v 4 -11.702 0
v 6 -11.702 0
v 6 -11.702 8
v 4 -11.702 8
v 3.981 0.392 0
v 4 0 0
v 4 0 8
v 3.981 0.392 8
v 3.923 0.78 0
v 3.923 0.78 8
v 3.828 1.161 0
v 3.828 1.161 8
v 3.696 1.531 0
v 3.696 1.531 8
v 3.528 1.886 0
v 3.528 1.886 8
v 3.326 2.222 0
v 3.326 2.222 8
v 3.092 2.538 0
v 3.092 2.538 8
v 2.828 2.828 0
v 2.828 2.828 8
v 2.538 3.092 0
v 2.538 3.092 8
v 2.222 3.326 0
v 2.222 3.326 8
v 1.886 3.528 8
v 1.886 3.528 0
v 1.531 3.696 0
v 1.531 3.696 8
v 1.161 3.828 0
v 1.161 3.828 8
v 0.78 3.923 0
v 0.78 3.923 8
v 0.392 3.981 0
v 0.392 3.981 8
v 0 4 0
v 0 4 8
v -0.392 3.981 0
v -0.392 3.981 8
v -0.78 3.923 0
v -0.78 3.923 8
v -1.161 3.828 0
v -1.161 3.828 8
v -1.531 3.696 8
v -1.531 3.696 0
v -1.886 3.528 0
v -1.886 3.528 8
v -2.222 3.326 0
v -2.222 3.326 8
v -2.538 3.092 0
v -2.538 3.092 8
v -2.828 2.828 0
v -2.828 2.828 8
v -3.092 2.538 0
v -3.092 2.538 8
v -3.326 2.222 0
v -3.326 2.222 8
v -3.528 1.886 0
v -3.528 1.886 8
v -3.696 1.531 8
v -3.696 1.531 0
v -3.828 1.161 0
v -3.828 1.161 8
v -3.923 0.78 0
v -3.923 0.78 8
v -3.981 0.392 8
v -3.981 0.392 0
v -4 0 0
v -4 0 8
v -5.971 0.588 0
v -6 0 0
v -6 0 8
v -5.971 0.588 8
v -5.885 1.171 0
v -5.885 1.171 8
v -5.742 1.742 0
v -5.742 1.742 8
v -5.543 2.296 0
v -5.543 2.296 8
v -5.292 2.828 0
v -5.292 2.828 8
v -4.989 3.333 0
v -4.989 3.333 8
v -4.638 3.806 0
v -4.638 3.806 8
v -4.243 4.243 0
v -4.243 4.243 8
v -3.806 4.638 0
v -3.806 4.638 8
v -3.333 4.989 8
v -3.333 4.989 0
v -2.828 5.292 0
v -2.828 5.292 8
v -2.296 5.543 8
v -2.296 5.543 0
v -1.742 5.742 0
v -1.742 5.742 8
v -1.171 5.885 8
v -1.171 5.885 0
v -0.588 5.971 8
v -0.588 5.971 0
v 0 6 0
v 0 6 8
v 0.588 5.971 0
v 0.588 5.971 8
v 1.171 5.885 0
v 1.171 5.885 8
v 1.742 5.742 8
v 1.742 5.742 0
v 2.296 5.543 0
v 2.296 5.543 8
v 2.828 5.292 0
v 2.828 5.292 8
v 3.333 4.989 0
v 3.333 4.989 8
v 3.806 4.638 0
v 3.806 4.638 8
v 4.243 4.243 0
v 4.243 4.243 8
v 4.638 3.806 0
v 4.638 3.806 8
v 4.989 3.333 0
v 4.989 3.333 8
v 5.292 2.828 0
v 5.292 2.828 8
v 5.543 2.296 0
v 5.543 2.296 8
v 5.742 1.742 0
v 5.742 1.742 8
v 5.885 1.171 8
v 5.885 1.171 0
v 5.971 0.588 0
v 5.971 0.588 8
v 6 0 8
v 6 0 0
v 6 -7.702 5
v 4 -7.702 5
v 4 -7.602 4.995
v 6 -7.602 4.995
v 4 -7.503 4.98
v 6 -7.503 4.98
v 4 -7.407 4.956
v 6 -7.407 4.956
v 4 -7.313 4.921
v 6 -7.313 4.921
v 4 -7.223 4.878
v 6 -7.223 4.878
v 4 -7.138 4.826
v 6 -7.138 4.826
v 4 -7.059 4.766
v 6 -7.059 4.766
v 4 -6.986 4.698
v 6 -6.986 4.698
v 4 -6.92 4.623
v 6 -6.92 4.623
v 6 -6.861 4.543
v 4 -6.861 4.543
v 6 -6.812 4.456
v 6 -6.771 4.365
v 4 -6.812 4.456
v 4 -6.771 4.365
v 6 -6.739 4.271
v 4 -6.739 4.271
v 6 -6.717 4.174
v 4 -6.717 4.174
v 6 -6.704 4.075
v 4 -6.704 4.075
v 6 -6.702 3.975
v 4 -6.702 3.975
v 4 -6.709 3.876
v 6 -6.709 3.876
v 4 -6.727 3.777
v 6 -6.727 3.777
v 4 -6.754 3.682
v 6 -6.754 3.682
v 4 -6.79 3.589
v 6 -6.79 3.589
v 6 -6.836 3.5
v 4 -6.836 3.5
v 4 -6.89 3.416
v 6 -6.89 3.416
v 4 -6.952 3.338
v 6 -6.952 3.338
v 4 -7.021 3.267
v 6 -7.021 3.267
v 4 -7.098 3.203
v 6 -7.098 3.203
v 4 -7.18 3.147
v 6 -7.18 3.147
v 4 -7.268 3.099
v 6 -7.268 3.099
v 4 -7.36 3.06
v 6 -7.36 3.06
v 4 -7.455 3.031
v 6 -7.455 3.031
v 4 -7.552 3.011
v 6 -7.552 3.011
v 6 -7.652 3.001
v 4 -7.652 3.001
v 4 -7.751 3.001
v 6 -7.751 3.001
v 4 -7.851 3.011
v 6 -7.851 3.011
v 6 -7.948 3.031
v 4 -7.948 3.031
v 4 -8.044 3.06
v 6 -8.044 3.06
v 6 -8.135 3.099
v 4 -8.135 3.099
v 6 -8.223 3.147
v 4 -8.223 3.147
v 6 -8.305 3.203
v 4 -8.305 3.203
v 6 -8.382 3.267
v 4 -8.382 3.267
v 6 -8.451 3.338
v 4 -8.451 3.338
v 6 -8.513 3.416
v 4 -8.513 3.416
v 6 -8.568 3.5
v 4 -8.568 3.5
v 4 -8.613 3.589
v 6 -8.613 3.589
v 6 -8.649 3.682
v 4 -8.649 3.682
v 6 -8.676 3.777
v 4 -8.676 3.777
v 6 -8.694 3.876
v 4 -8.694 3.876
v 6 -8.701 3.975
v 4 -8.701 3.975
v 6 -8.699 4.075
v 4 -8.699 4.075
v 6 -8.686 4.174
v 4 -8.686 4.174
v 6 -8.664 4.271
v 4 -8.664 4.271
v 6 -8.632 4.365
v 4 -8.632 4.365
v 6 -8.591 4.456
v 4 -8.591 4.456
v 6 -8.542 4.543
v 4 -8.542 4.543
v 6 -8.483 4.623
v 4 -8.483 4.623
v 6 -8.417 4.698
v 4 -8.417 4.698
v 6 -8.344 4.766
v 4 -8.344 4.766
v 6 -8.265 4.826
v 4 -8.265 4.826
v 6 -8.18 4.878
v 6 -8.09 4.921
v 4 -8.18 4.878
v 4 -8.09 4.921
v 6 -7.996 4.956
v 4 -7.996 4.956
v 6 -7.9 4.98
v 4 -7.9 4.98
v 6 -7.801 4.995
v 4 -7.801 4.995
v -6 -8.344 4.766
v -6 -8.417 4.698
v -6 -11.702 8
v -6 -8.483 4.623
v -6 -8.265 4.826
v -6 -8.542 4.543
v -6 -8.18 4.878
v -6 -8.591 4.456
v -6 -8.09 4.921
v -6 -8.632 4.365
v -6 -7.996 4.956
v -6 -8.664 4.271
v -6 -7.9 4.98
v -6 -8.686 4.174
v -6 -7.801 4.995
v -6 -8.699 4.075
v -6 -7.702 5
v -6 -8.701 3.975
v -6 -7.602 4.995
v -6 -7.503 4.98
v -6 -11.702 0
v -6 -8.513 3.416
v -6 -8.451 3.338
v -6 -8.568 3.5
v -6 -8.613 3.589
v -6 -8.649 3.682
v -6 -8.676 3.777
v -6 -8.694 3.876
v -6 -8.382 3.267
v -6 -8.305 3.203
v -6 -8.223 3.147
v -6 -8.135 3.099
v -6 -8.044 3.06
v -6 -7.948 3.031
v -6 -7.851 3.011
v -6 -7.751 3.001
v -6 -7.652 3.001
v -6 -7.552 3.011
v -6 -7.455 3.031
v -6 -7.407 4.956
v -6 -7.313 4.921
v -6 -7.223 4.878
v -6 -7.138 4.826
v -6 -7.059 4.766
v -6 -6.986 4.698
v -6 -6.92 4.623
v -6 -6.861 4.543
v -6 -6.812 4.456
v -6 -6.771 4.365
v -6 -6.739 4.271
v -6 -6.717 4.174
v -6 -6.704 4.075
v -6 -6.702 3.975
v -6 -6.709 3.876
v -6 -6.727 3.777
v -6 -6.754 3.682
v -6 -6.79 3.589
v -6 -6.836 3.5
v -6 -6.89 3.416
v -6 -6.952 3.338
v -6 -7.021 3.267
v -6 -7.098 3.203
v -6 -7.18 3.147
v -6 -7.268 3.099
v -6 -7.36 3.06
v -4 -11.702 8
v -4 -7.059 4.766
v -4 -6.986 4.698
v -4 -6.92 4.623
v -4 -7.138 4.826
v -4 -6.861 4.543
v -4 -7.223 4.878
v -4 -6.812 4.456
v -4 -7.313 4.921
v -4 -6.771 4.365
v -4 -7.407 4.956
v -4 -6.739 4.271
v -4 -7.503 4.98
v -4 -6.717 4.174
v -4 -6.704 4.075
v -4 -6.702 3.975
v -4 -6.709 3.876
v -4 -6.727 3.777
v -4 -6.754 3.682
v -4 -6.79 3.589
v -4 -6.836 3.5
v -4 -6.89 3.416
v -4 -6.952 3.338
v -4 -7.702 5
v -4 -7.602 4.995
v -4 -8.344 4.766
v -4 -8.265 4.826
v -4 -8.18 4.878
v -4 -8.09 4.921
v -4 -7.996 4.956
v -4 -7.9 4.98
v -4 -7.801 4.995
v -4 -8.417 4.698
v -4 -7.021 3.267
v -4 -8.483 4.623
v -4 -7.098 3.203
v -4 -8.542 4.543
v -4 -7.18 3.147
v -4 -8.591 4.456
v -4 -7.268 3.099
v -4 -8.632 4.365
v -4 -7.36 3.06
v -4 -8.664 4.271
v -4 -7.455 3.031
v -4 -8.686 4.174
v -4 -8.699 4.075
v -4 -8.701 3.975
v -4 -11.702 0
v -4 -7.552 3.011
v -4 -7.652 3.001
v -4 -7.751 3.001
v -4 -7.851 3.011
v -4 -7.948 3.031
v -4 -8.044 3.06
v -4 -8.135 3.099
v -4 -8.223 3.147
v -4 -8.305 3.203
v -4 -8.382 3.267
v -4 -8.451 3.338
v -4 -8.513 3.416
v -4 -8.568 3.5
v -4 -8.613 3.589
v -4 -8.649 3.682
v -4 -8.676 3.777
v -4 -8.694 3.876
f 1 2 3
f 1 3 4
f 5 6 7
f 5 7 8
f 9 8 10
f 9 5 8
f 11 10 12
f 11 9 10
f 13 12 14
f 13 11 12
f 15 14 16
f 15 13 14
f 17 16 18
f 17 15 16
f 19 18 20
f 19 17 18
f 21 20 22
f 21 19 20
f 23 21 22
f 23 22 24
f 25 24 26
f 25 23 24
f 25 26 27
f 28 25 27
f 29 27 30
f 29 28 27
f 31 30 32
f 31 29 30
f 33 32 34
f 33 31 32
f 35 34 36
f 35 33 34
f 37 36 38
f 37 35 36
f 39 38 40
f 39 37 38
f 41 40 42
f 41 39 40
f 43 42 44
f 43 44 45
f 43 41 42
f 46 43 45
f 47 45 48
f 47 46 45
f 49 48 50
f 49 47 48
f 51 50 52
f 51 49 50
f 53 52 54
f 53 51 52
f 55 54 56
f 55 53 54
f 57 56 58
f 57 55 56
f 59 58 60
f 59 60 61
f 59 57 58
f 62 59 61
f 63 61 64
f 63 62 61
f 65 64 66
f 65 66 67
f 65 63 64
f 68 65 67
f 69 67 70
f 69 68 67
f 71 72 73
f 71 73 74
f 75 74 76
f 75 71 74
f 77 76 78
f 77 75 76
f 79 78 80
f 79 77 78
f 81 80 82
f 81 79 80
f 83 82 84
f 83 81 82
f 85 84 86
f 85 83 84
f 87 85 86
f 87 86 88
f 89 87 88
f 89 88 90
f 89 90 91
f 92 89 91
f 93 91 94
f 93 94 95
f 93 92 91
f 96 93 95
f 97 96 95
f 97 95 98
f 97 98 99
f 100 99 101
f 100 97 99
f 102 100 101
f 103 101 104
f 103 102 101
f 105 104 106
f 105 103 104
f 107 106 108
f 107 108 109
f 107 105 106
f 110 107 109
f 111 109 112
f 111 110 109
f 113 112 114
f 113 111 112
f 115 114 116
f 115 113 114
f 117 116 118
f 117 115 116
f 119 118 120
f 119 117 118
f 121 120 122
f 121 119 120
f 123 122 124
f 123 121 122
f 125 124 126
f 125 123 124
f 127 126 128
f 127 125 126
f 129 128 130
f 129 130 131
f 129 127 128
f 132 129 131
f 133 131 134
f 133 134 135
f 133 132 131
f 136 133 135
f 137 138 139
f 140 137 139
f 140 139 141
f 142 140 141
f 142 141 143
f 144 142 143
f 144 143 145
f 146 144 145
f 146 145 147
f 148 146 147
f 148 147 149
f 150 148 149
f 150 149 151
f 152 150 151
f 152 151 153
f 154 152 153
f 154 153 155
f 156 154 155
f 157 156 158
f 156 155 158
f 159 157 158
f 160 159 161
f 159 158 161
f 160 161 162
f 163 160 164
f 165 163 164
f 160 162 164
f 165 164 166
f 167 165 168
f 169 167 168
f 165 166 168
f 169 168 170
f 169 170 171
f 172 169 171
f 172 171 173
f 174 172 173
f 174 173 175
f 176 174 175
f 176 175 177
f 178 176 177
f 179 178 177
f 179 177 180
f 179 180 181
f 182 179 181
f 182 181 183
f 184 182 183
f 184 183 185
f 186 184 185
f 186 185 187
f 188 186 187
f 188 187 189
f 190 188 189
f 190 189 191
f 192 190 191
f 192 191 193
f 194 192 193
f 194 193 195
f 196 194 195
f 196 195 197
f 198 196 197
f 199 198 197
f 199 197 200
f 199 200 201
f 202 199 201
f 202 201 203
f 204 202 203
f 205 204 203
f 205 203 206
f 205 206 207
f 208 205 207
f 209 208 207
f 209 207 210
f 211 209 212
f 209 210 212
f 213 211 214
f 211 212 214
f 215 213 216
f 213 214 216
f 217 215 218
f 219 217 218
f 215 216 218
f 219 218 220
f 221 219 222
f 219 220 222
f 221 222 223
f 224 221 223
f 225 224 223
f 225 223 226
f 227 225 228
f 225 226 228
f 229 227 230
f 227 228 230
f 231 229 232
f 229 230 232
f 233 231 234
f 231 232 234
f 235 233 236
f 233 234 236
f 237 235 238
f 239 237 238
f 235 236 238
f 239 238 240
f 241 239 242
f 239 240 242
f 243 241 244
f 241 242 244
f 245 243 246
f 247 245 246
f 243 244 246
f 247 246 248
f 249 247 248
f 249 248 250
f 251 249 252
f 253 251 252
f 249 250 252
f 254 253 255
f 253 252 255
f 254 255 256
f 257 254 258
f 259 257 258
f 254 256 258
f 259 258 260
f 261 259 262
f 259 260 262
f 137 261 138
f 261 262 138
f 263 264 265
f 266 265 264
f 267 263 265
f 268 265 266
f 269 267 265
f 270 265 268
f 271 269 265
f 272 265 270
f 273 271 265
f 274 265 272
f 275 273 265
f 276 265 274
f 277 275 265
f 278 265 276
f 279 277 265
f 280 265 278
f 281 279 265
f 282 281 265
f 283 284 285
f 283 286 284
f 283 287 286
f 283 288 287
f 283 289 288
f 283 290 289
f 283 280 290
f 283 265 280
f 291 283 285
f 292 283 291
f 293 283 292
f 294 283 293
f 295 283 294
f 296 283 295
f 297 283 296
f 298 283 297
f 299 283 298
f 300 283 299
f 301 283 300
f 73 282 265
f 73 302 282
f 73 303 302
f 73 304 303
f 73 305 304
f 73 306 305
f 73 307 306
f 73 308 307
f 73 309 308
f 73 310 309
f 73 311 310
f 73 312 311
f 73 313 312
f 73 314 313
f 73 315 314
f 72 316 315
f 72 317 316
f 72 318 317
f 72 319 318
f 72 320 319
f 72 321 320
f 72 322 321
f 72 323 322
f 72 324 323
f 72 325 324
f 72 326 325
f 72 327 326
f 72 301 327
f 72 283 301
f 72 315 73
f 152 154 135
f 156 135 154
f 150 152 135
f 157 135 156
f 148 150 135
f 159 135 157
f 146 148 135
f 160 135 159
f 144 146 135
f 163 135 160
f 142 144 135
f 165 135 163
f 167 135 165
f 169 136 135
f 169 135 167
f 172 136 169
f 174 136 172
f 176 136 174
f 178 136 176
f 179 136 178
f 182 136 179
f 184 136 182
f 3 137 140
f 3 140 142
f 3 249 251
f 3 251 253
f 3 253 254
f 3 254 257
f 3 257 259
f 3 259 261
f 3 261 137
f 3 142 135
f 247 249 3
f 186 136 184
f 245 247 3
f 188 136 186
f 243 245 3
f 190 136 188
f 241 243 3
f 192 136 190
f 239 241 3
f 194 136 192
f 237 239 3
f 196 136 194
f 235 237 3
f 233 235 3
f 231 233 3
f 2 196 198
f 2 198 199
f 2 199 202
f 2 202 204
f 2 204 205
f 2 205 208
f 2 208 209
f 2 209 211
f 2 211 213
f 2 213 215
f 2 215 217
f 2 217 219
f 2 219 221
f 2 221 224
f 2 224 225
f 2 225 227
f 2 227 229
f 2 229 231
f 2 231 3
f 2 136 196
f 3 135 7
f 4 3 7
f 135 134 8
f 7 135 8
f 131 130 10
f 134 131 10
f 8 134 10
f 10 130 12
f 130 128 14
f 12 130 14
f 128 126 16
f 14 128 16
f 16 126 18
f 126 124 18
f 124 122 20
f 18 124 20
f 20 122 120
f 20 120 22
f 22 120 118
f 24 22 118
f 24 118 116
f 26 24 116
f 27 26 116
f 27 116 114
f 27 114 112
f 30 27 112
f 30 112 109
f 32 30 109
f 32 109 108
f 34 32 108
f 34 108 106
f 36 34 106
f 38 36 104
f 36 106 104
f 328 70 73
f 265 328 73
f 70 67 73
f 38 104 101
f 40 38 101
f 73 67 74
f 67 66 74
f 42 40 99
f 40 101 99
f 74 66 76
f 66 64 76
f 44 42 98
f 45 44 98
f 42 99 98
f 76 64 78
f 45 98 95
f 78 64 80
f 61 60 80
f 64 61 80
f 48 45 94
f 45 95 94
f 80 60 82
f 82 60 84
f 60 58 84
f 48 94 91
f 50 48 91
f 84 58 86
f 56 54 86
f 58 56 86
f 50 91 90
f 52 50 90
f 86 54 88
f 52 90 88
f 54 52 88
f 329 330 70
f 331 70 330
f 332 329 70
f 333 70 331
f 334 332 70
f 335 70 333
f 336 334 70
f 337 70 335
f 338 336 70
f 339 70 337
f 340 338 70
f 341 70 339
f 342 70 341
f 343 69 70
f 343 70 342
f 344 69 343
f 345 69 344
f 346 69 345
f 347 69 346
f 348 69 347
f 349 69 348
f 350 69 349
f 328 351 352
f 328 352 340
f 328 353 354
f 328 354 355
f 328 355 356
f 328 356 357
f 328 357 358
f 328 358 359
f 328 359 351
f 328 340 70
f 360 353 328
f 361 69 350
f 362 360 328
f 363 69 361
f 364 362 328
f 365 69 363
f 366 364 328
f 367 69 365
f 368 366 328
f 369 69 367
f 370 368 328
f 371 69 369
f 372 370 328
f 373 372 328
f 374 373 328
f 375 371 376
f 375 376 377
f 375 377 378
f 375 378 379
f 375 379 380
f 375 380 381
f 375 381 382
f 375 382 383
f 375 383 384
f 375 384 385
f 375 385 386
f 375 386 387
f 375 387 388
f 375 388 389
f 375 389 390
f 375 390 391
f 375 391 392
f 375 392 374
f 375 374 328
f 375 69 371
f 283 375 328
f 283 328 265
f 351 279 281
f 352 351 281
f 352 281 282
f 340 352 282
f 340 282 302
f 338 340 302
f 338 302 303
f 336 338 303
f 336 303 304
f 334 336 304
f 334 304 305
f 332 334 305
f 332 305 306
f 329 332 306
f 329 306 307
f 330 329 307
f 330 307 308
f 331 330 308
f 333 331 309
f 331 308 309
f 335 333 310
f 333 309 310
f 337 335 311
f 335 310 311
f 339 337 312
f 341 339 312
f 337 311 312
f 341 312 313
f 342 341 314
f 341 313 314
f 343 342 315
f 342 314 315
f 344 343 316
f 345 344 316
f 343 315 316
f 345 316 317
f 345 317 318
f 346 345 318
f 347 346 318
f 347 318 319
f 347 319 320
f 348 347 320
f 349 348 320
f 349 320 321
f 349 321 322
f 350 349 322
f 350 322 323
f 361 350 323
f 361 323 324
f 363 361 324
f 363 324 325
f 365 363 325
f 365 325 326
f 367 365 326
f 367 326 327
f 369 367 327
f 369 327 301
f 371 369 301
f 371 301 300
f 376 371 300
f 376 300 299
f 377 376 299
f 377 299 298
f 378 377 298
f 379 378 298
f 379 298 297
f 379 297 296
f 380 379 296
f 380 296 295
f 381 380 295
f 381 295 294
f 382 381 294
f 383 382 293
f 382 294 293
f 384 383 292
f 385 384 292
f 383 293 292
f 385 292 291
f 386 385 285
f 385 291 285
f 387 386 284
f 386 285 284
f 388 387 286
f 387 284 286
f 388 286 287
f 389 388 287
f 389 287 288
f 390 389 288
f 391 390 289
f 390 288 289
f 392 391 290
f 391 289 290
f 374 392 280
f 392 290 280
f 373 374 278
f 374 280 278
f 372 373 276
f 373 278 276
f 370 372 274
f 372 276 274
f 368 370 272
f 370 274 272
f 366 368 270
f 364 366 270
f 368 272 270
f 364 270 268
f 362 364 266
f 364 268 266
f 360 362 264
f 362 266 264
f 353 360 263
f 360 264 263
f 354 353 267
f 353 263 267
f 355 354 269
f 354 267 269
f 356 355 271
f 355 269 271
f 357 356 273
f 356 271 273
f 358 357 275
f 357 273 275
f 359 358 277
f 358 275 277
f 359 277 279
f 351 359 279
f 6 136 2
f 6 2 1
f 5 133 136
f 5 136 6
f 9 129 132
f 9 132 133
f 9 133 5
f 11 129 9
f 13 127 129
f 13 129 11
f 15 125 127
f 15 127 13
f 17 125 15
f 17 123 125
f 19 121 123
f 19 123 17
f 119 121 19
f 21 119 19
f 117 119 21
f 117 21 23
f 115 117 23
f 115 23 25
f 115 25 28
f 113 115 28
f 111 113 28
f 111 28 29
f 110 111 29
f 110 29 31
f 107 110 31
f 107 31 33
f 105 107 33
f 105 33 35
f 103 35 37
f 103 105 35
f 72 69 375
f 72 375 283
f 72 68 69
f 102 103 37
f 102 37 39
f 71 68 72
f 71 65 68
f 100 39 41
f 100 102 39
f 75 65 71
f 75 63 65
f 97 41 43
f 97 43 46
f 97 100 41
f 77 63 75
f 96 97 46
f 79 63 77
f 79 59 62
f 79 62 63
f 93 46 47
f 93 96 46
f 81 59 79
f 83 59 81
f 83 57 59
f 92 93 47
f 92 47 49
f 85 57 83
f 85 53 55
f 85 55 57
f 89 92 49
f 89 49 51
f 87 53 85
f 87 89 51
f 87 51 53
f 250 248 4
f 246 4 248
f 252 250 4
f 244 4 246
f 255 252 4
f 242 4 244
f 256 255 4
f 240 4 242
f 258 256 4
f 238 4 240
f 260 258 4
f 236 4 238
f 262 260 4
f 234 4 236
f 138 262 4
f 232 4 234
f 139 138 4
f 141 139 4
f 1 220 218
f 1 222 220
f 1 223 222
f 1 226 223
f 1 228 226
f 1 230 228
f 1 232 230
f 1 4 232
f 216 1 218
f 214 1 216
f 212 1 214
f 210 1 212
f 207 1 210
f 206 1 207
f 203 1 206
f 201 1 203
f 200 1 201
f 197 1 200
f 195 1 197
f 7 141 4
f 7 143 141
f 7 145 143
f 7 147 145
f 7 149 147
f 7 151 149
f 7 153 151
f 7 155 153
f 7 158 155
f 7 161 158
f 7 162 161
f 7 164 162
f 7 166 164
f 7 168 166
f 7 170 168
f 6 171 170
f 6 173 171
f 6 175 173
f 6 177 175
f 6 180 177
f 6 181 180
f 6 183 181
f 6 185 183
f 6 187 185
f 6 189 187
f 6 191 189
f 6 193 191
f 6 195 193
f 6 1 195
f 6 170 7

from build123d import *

# Parameters (mm, degrees)
BOSS_EXTRUDE1_DEPTH = 8
SKETCH2_R           = 1
CUT_EXTRUDE1_DEPTH  = 19.572175383


with BuildPart() as part:
    # Sketch1 → Boss-Extrude1 (new body)
    with BuildSketch(Plane.XY):
        with BuildLine():
            Line((-4, 0), (-4, -11.701525476))
            Line((-4, -11.701525476), (-6, -11.701525476))
            Line((-6, -11.701525476), (-6, 0))
            ThreePointArc((-6, 0), (0, 6), (6, 0))
            Line((6, 0), (6, -11.701525476))
            Line((6, -11.701525476), (3.999999999, -11.701525476))
            Line((3.999999999, -11.701525476), (4, 0))
            ThreePointArc((4, 0), (0, 4), (-4, 0))
        make_face()
    extrude(amount=BOSS_EXTRUDE1_DEPTH)

    # Sketch2 → Cut-Extrude1 (cut, through all)
    with BuildSketch(Plane.ZY.offset(6)):
        with Locations((4, -7.701525476)):
            Circle(SKETCH2_R)
    extrude(amount=-CUT_EXTRUDE1_DEPTH, mode=Mode.SUBTRACT)


solid = part.part
